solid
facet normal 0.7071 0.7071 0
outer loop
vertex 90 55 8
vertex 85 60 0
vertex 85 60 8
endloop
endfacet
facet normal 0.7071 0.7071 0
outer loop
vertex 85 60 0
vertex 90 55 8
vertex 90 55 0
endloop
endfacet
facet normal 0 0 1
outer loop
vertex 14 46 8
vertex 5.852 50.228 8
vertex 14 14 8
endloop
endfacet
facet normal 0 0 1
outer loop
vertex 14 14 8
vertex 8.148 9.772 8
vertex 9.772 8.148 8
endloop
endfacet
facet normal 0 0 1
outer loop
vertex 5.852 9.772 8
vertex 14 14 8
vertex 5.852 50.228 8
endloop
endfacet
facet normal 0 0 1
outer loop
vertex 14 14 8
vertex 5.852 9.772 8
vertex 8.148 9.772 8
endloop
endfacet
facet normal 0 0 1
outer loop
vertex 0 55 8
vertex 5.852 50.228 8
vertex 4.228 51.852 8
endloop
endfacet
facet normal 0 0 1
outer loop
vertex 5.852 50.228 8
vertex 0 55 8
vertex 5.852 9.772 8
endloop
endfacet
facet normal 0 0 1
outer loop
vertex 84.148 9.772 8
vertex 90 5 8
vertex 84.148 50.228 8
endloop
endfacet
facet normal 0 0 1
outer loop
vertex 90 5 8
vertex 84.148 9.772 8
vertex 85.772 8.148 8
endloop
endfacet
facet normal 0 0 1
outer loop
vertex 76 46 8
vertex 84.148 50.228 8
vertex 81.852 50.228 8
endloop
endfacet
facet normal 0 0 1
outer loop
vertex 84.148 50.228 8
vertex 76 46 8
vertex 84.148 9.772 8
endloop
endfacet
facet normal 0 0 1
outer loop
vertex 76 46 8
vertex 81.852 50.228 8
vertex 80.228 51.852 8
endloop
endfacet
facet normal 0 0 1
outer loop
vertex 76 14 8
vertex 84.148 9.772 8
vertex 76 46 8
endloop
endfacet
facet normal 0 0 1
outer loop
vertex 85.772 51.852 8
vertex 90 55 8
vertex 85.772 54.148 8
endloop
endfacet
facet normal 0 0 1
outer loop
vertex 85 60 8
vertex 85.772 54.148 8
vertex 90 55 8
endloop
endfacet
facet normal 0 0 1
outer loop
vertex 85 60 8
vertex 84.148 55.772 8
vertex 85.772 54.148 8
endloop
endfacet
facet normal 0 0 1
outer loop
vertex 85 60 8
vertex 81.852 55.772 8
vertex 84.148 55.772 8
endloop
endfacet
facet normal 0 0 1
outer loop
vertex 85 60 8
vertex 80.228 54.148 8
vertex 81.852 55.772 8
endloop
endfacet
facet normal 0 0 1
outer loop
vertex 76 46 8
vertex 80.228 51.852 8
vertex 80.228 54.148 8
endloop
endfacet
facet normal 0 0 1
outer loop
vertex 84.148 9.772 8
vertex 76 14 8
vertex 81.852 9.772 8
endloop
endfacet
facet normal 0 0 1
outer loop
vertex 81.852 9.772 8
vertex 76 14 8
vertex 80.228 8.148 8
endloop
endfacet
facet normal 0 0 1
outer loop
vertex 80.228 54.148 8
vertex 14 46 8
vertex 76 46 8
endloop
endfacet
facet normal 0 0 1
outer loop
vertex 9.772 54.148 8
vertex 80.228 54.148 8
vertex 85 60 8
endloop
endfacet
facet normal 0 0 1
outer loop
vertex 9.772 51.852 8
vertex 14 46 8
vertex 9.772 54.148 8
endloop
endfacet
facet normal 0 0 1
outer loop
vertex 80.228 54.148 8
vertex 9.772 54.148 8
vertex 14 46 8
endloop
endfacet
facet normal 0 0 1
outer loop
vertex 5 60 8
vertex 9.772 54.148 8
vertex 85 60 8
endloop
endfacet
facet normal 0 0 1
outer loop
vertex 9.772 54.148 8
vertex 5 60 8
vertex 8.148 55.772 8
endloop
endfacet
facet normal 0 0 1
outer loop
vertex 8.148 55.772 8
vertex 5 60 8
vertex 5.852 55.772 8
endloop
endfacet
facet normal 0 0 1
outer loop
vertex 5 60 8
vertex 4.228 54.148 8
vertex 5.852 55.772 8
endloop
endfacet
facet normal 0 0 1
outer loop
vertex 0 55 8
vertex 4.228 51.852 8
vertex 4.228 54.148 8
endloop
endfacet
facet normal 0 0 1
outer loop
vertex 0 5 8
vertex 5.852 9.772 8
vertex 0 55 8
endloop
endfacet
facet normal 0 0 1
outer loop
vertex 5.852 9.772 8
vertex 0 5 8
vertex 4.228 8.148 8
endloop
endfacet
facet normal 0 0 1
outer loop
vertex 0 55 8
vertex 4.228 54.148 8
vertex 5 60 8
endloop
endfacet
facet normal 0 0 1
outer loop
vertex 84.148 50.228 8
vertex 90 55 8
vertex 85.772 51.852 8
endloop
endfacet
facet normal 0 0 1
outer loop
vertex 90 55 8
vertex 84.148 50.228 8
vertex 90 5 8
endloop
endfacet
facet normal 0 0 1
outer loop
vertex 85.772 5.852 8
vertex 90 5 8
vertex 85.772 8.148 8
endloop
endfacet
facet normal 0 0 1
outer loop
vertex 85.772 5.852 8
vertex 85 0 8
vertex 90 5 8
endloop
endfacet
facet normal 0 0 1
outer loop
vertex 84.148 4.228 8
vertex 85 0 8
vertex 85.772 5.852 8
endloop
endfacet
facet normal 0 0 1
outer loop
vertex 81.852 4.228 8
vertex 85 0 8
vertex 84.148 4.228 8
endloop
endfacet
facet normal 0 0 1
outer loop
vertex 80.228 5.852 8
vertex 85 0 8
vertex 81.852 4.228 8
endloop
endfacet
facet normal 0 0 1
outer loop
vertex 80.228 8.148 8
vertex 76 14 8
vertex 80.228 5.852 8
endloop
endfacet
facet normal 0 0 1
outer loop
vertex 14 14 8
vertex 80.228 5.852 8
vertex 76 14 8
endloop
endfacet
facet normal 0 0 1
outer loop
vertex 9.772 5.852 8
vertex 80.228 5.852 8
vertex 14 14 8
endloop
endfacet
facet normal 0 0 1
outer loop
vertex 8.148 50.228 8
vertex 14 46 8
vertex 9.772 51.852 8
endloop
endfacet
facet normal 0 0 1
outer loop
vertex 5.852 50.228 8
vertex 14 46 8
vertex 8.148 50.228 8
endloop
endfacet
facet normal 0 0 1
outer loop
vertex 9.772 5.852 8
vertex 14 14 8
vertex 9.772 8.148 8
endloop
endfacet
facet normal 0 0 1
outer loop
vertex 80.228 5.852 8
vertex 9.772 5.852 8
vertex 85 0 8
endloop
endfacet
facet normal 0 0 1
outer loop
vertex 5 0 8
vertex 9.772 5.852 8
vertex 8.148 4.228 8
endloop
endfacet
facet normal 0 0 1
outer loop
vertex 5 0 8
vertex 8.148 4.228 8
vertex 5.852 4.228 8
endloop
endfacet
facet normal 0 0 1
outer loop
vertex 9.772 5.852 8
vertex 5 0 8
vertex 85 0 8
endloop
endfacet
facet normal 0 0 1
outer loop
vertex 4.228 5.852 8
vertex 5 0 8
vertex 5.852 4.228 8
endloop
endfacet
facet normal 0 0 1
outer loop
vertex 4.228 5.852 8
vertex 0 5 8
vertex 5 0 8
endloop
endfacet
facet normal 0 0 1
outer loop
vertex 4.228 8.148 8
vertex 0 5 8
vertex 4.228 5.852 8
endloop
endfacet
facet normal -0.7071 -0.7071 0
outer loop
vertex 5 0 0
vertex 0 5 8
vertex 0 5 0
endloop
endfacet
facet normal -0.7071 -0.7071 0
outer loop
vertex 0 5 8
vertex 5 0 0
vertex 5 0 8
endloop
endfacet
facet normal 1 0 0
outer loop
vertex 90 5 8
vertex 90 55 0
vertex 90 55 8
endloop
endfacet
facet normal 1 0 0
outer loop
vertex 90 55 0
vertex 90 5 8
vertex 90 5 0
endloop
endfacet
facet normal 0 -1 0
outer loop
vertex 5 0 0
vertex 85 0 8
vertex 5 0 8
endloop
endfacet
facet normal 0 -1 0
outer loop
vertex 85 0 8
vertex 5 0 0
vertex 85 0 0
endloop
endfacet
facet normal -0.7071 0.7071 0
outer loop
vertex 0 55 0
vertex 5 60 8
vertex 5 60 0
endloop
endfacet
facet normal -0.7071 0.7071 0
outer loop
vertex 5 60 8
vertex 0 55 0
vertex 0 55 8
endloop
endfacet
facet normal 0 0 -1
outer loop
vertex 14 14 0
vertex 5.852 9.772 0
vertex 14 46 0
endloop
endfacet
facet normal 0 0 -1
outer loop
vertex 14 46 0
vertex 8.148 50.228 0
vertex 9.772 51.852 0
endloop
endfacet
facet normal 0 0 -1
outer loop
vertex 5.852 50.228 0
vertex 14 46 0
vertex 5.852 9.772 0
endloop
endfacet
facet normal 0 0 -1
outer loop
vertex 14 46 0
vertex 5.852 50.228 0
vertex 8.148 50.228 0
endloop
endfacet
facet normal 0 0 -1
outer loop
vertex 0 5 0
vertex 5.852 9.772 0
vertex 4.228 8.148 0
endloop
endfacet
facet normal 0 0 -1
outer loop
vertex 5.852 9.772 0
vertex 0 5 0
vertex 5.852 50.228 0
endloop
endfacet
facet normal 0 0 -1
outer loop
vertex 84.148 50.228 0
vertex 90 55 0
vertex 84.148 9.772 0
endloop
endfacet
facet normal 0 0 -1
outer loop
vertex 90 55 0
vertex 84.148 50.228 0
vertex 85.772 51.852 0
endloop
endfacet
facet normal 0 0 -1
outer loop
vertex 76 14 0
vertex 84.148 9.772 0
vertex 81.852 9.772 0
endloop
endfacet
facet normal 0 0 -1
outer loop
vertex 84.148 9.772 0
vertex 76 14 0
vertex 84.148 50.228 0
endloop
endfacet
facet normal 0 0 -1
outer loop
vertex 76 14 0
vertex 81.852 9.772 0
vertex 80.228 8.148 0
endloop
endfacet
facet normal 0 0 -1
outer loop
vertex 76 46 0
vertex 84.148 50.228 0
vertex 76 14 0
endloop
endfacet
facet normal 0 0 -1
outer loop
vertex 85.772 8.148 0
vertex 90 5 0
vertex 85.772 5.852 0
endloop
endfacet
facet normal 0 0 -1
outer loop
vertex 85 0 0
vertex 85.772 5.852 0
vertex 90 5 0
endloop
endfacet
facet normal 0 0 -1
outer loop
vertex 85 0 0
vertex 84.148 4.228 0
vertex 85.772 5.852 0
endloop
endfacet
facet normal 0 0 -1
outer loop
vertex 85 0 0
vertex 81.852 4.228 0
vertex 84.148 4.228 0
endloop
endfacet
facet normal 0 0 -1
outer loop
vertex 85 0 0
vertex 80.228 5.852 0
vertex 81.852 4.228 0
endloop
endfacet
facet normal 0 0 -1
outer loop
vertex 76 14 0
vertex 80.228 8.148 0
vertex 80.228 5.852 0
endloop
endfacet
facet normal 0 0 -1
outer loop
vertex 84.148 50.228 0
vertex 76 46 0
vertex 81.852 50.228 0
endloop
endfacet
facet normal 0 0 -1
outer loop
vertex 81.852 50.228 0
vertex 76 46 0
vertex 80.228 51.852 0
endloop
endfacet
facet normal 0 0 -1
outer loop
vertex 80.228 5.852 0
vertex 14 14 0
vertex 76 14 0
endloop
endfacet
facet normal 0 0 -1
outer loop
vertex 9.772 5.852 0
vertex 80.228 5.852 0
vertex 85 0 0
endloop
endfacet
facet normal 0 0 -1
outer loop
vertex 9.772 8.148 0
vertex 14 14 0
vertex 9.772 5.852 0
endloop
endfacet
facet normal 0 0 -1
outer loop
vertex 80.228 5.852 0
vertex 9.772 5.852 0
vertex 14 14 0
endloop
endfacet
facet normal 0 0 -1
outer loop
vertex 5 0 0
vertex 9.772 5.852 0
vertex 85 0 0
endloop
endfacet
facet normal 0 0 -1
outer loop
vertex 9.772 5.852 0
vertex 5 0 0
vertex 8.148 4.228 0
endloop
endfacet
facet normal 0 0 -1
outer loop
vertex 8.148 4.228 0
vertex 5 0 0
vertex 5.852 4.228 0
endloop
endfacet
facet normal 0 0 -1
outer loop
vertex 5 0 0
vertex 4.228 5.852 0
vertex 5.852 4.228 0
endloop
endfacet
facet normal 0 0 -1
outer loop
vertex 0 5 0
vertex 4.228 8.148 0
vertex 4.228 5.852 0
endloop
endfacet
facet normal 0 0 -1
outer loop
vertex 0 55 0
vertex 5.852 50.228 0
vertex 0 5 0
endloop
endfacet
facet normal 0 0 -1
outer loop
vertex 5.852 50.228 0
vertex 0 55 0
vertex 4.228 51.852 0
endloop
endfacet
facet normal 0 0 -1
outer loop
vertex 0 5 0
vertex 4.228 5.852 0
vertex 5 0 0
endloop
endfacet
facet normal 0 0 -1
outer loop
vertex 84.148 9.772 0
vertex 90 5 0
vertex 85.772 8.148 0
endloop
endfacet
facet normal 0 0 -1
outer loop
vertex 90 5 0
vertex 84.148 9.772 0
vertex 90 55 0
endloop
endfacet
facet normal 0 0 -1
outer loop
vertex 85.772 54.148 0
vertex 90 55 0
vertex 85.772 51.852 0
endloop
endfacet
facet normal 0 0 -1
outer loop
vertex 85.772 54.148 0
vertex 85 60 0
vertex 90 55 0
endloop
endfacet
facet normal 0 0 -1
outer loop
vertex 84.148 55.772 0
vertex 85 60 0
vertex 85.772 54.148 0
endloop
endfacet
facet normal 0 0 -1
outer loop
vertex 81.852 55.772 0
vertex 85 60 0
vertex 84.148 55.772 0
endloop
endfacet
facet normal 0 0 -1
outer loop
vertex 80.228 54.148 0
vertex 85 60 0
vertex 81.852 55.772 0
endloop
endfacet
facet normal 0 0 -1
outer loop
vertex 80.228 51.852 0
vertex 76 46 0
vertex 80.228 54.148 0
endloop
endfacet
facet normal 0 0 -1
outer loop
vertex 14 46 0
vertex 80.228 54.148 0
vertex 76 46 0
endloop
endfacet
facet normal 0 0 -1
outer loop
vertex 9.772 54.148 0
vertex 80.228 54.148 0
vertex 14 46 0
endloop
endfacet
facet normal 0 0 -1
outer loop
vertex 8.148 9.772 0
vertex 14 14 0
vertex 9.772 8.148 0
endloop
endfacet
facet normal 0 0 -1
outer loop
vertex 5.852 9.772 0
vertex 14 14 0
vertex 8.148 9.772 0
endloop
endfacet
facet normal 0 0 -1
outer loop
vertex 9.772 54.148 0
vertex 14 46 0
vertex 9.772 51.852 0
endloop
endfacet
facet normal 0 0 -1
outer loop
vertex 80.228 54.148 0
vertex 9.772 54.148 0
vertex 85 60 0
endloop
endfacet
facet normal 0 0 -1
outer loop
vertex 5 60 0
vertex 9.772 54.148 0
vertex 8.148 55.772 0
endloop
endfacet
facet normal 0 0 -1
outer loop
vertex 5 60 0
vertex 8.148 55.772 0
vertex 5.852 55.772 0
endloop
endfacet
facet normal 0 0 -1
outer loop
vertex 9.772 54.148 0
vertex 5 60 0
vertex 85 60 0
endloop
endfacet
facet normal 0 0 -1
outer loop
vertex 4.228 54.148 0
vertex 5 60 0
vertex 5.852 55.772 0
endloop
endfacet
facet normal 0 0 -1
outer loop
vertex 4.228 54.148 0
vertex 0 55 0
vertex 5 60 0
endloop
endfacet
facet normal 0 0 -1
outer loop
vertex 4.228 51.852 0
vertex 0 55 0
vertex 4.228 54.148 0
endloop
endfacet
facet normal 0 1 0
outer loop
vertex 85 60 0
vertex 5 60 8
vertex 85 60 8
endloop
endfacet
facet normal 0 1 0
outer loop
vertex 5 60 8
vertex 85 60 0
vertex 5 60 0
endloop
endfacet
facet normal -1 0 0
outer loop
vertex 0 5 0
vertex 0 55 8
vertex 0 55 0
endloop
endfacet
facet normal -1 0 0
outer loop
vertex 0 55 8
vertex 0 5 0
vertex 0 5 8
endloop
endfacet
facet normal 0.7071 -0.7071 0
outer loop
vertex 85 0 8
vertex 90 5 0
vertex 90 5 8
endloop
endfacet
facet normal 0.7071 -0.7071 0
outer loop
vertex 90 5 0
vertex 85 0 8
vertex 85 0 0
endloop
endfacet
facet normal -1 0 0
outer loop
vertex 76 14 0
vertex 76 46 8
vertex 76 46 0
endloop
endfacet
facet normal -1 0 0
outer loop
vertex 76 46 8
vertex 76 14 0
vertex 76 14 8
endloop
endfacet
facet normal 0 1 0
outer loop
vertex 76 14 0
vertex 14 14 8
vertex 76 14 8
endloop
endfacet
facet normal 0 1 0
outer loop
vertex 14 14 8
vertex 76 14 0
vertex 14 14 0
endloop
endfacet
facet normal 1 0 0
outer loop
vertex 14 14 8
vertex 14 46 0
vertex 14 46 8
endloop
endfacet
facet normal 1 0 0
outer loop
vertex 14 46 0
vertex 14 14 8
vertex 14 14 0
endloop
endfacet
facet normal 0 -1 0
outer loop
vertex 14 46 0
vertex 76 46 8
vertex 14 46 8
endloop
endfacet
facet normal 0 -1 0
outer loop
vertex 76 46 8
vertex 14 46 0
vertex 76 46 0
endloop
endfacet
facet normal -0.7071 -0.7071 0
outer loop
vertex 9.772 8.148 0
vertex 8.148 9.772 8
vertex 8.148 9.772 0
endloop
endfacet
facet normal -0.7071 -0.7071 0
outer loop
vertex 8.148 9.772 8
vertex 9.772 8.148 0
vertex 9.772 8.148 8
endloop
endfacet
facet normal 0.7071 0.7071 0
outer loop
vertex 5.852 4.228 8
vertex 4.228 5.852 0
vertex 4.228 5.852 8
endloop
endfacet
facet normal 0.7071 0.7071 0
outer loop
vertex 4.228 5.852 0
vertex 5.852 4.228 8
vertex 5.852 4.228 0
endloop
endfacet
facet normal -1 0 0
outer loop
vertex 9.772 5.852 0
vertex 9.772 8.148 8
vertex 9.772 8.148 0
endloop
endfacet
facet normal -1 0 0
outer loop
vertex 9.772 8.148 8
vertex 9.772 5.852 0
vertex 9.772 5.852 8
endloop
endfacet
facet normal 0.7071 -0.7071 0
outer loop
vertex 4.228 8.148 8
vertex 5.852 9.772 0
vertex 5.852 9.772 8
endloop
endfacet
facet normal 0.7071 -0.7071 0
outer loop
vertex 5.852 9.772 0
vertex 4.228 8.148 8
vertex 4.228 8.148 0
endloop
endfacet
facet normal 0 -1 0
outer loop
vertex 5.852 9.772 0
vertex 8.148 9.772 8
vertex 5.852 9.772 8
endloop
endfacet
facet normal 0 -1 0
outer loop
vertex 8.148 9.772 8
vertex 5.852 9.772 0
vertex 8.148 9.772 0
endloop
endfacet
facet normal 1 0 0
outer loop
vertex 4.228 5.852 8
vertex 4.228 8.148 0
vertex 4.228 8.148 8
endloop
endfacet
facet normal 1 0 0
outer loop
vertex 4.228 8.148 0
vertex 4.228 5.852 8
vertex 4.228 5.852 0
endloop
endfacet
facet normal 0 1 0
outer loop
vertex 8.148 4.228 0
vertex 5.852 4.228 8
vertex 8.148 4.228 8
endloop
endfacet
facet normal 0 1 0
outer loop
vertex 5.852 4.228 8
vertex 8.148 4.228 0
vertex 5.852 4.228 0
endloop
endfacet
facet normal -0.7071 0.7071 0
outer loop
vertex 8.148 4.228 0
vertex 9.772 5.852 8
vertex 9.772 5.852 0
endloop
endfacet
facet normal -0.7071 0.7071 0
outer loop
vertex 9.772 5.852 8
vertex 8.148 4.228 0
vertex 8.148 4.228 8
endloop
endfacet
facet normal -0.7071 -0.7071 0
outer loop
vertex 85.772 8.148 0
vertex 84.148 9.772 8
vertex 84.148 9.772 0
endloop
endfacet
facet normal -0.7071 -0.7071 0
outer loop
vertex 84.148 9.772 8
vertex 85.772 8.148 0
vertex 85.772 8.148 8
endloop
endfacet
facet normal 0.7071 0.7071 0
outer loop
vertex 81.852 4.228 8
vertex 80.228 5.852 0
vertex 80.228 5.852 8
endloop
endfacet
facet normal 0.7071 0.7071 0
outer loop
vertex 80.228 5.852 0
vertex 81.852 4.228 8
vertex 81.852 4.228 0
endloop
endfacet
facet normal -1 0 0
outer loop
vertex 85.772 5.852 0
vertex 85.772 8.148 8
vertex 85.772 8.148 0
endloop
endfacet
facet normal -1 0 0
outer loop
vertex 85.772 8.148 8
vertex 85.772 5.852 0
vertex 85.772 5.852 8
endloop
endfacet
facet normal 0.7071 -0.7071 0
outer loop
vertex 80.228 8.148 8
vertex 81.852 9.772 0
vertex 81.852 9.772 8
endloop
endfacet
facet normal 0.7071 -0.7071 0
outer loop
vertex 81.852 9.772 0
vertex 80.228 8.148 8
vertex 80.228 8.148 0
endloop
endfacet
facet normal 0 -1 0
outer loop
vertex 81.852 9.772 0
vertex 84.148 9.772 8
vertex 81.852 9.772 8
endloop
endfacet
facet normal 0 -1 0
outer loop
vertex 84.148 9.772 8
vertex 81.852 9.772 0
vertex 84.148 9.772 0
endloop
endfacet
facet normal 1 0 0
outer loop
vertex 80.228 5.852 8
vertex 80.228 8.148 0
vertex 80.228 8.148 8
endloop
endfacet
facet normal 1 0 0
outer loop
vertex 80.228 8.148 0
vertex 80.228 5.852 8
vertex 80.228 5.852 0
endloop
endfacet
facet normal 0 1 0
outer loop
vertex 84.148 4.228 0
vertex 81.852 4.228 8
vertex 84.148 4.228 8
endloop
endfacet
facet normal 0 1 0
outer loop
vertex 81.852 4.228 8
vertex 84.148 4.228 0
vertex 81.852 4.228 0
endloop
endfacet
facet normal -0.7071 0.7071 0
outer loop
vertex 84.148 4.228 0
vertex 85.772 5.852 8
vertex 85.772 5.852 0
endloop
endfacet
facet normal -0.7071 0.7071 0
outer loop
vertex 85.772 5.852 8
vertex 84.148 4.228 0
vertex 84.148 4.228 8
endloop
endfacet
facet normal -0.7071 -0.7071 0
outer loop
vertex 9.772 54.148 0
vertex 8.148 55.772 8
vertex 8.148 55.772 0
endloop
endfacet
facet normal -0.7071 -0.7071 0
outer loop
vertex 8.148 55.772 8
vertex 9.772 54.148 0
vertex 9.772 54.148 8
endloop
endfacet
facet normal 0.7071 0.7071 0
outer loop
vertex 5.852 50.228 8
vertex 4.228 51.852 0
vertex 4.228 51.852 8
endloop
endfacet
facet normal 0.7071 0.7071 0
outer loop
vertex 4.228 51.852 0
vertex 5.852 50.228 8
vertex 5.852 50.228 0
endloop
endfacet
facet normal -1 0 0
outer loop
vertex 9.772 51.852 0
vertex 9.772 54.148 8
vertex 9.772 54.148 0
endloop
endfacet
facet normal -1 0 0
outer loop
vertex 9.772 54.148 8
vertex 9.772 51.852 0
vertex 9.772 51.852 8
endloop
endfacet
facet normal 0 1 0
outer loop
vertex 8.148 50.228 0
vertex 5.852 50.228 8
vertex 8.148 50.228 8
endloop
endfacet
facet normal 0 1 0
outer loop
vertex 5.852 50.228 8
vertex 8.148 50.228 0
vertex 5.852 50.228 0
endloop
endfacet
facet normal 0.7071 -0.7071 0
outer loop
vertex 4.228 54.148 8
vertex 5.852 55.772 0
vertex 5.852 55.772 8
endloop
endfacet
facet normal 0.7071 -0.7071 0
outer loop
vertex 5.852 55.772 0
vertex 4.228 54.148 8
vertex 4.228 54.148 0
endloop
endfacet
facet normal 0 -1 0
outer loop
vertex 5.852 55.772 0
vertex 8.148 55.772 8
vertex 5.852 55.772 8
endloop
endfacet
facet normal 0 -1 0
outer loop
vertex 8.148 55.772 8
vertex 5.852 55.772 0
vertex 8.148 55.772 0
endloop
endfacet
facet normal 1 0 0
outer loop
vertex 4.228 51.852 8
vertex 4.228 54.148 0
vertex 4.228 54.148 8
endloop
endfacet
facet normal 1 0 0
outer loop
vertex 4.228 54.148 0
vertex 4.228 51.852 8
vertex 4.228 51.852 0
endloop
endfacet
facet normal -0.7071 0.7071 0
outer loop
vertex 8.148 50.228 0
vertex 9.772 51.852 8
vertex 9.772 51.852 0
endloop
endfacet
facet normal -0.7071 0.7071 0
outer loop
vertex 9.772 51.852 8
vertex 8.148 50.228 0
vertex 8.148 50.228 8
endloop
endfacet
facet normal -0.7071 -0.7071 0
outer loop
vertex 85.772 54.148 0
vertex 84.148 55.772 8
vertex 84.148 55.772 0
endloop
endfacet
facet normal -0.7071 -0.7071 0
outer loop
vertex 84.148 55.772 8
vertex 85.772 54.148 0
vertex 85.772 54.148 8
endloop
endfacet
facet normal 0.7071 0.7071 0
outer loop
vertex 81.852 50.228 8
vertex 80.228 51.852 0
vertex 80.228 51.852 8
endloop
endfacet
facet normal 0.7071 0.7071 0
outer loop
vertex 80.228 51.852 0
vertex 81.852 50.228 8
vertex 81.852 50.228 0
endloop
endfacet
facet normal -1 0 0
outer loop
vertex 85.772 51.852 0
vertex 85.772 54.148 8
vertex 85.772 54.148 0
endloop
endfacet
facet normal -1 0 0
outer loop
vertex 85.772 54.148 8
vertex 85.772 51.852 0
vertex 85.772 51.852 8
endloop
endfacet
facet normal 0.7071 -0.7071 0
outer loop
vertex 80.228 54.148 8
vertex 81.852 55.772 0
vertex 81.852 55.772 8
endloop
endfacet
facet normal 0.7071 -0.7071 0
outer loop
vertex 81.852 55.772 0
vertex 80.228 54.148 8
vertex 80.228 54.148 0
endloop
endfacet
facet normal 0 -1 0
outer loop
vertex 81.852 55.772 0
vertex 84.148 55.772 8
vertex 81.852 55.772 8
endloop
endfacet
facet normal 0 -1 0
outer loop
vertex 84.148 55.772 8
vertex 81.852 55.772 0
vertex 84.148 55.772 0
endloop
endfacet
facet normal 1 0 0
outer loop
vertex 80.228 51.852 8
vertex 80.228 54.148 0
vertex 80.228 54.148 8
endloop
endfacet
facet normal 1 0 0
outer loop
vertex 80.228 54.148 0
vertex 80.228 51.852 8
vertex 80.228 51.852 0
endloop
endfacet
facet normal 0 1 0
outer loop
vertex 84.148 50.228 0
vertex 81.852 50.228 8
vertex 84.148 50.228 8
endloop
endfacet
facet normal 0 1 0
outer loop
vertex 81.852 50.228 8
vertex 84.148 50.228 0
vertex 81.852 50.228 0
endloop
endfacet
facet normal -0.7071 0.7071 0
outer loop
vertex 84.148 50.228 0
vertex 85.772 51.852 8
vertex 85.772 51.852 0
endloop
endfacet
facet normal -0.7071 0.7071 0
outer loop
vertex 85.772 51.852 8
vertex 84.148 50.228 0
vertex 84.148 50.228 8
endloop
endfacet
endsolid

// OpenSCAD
$fn = 32;

// ----------------------------------------------------------------------
// Frame plate: 90 x 60 frame, 14 mm rails
// ----------------------------------------------------------------------

// --- parameters (mm) ---
plate_l = 90;             // plate length, X
plate_w = 60;             // plate width, Y
plate_t = 8;              // plate thickness, Z (extrusion height)
corner_c = 5;             // corner chamfer
frame_bar = 14;           // frame rail width
bolt_r = 3;               // corner bolt window radius
bolt_inset = 7;           // bolt centre inset from the edges

win_l = plate_l - 2 * frame_bar;  // window length
win_w = plate_w - 2 * frame_bar;  // window width
bolt_d = 2 * bolt_r;  // corner hole diameter

profile = [[5, 0], [85, 0], [90, 5], [90, 55], [85, 60], [5, 60], [0, 55], [0, 5]];  // primary outline, 8 points, counter clockwise
void_1 = [[14, 14], [76, 14], [76, 46], [14, 46]];  // the window, 4 points
void_2 = [[9.772, 8.148], [8.148, 9.772], [5.852, 9.772], [4.228, 8.148], [4.228, 5.852], [5.852, 4.228], [8.148, 4.228], [9.772, 5.852]];  // corner bolt window, 8 points
void_3 = [[85.772, 8.148], [84.148, 9.772], [81.852, 9.772], [80.228, 8.148], [80.228, 5.852], [81.852, 4.228], [84.148, 4.228], [85.772, 5.852]];  // corner bolt window, 8 points
void_4 = [[9.772, 54.148], [8.148, 55.772], [5.852, 55.772], [4.228, 54.148], [4.228, 51.852], [5.852, 50.228], [8.148, 50.228], [9.772, 51.852]];  // corner bolt window, 8 points
void_5 = [[85.772, 54.148], [84.148, 55.772], [81.852, 55.772], [80.228, 54.148], [80.228, 51.852], [81.852, 50.228], [84.148, 50.228], [85.772, 51.852]];  // corner bolt window, 8 points

// --- the one profile operation ---
difference() {
  linear_extrude(height = plate_t) polygon(points = profile);
  translate([0, 0, -1])
    linear_extrude(height = plate_t + 2) polygon(points = void_1);
  translate([0, 0, -1])
    linear_extrude(height = plate_t + 2) polygon(points = void_2);
  translate([0, 0, -1])
    linear_extrude(height = plate_t + 2) polygon(points = void_3);
  translate([0, 0, -1])
    linear_extrude(height = plate_t + 2) polygon(points = void_4);
  translate([0, 0, -1])
    linear_extrude(height = plate_t + 2) polygon(points = void_5);
}
